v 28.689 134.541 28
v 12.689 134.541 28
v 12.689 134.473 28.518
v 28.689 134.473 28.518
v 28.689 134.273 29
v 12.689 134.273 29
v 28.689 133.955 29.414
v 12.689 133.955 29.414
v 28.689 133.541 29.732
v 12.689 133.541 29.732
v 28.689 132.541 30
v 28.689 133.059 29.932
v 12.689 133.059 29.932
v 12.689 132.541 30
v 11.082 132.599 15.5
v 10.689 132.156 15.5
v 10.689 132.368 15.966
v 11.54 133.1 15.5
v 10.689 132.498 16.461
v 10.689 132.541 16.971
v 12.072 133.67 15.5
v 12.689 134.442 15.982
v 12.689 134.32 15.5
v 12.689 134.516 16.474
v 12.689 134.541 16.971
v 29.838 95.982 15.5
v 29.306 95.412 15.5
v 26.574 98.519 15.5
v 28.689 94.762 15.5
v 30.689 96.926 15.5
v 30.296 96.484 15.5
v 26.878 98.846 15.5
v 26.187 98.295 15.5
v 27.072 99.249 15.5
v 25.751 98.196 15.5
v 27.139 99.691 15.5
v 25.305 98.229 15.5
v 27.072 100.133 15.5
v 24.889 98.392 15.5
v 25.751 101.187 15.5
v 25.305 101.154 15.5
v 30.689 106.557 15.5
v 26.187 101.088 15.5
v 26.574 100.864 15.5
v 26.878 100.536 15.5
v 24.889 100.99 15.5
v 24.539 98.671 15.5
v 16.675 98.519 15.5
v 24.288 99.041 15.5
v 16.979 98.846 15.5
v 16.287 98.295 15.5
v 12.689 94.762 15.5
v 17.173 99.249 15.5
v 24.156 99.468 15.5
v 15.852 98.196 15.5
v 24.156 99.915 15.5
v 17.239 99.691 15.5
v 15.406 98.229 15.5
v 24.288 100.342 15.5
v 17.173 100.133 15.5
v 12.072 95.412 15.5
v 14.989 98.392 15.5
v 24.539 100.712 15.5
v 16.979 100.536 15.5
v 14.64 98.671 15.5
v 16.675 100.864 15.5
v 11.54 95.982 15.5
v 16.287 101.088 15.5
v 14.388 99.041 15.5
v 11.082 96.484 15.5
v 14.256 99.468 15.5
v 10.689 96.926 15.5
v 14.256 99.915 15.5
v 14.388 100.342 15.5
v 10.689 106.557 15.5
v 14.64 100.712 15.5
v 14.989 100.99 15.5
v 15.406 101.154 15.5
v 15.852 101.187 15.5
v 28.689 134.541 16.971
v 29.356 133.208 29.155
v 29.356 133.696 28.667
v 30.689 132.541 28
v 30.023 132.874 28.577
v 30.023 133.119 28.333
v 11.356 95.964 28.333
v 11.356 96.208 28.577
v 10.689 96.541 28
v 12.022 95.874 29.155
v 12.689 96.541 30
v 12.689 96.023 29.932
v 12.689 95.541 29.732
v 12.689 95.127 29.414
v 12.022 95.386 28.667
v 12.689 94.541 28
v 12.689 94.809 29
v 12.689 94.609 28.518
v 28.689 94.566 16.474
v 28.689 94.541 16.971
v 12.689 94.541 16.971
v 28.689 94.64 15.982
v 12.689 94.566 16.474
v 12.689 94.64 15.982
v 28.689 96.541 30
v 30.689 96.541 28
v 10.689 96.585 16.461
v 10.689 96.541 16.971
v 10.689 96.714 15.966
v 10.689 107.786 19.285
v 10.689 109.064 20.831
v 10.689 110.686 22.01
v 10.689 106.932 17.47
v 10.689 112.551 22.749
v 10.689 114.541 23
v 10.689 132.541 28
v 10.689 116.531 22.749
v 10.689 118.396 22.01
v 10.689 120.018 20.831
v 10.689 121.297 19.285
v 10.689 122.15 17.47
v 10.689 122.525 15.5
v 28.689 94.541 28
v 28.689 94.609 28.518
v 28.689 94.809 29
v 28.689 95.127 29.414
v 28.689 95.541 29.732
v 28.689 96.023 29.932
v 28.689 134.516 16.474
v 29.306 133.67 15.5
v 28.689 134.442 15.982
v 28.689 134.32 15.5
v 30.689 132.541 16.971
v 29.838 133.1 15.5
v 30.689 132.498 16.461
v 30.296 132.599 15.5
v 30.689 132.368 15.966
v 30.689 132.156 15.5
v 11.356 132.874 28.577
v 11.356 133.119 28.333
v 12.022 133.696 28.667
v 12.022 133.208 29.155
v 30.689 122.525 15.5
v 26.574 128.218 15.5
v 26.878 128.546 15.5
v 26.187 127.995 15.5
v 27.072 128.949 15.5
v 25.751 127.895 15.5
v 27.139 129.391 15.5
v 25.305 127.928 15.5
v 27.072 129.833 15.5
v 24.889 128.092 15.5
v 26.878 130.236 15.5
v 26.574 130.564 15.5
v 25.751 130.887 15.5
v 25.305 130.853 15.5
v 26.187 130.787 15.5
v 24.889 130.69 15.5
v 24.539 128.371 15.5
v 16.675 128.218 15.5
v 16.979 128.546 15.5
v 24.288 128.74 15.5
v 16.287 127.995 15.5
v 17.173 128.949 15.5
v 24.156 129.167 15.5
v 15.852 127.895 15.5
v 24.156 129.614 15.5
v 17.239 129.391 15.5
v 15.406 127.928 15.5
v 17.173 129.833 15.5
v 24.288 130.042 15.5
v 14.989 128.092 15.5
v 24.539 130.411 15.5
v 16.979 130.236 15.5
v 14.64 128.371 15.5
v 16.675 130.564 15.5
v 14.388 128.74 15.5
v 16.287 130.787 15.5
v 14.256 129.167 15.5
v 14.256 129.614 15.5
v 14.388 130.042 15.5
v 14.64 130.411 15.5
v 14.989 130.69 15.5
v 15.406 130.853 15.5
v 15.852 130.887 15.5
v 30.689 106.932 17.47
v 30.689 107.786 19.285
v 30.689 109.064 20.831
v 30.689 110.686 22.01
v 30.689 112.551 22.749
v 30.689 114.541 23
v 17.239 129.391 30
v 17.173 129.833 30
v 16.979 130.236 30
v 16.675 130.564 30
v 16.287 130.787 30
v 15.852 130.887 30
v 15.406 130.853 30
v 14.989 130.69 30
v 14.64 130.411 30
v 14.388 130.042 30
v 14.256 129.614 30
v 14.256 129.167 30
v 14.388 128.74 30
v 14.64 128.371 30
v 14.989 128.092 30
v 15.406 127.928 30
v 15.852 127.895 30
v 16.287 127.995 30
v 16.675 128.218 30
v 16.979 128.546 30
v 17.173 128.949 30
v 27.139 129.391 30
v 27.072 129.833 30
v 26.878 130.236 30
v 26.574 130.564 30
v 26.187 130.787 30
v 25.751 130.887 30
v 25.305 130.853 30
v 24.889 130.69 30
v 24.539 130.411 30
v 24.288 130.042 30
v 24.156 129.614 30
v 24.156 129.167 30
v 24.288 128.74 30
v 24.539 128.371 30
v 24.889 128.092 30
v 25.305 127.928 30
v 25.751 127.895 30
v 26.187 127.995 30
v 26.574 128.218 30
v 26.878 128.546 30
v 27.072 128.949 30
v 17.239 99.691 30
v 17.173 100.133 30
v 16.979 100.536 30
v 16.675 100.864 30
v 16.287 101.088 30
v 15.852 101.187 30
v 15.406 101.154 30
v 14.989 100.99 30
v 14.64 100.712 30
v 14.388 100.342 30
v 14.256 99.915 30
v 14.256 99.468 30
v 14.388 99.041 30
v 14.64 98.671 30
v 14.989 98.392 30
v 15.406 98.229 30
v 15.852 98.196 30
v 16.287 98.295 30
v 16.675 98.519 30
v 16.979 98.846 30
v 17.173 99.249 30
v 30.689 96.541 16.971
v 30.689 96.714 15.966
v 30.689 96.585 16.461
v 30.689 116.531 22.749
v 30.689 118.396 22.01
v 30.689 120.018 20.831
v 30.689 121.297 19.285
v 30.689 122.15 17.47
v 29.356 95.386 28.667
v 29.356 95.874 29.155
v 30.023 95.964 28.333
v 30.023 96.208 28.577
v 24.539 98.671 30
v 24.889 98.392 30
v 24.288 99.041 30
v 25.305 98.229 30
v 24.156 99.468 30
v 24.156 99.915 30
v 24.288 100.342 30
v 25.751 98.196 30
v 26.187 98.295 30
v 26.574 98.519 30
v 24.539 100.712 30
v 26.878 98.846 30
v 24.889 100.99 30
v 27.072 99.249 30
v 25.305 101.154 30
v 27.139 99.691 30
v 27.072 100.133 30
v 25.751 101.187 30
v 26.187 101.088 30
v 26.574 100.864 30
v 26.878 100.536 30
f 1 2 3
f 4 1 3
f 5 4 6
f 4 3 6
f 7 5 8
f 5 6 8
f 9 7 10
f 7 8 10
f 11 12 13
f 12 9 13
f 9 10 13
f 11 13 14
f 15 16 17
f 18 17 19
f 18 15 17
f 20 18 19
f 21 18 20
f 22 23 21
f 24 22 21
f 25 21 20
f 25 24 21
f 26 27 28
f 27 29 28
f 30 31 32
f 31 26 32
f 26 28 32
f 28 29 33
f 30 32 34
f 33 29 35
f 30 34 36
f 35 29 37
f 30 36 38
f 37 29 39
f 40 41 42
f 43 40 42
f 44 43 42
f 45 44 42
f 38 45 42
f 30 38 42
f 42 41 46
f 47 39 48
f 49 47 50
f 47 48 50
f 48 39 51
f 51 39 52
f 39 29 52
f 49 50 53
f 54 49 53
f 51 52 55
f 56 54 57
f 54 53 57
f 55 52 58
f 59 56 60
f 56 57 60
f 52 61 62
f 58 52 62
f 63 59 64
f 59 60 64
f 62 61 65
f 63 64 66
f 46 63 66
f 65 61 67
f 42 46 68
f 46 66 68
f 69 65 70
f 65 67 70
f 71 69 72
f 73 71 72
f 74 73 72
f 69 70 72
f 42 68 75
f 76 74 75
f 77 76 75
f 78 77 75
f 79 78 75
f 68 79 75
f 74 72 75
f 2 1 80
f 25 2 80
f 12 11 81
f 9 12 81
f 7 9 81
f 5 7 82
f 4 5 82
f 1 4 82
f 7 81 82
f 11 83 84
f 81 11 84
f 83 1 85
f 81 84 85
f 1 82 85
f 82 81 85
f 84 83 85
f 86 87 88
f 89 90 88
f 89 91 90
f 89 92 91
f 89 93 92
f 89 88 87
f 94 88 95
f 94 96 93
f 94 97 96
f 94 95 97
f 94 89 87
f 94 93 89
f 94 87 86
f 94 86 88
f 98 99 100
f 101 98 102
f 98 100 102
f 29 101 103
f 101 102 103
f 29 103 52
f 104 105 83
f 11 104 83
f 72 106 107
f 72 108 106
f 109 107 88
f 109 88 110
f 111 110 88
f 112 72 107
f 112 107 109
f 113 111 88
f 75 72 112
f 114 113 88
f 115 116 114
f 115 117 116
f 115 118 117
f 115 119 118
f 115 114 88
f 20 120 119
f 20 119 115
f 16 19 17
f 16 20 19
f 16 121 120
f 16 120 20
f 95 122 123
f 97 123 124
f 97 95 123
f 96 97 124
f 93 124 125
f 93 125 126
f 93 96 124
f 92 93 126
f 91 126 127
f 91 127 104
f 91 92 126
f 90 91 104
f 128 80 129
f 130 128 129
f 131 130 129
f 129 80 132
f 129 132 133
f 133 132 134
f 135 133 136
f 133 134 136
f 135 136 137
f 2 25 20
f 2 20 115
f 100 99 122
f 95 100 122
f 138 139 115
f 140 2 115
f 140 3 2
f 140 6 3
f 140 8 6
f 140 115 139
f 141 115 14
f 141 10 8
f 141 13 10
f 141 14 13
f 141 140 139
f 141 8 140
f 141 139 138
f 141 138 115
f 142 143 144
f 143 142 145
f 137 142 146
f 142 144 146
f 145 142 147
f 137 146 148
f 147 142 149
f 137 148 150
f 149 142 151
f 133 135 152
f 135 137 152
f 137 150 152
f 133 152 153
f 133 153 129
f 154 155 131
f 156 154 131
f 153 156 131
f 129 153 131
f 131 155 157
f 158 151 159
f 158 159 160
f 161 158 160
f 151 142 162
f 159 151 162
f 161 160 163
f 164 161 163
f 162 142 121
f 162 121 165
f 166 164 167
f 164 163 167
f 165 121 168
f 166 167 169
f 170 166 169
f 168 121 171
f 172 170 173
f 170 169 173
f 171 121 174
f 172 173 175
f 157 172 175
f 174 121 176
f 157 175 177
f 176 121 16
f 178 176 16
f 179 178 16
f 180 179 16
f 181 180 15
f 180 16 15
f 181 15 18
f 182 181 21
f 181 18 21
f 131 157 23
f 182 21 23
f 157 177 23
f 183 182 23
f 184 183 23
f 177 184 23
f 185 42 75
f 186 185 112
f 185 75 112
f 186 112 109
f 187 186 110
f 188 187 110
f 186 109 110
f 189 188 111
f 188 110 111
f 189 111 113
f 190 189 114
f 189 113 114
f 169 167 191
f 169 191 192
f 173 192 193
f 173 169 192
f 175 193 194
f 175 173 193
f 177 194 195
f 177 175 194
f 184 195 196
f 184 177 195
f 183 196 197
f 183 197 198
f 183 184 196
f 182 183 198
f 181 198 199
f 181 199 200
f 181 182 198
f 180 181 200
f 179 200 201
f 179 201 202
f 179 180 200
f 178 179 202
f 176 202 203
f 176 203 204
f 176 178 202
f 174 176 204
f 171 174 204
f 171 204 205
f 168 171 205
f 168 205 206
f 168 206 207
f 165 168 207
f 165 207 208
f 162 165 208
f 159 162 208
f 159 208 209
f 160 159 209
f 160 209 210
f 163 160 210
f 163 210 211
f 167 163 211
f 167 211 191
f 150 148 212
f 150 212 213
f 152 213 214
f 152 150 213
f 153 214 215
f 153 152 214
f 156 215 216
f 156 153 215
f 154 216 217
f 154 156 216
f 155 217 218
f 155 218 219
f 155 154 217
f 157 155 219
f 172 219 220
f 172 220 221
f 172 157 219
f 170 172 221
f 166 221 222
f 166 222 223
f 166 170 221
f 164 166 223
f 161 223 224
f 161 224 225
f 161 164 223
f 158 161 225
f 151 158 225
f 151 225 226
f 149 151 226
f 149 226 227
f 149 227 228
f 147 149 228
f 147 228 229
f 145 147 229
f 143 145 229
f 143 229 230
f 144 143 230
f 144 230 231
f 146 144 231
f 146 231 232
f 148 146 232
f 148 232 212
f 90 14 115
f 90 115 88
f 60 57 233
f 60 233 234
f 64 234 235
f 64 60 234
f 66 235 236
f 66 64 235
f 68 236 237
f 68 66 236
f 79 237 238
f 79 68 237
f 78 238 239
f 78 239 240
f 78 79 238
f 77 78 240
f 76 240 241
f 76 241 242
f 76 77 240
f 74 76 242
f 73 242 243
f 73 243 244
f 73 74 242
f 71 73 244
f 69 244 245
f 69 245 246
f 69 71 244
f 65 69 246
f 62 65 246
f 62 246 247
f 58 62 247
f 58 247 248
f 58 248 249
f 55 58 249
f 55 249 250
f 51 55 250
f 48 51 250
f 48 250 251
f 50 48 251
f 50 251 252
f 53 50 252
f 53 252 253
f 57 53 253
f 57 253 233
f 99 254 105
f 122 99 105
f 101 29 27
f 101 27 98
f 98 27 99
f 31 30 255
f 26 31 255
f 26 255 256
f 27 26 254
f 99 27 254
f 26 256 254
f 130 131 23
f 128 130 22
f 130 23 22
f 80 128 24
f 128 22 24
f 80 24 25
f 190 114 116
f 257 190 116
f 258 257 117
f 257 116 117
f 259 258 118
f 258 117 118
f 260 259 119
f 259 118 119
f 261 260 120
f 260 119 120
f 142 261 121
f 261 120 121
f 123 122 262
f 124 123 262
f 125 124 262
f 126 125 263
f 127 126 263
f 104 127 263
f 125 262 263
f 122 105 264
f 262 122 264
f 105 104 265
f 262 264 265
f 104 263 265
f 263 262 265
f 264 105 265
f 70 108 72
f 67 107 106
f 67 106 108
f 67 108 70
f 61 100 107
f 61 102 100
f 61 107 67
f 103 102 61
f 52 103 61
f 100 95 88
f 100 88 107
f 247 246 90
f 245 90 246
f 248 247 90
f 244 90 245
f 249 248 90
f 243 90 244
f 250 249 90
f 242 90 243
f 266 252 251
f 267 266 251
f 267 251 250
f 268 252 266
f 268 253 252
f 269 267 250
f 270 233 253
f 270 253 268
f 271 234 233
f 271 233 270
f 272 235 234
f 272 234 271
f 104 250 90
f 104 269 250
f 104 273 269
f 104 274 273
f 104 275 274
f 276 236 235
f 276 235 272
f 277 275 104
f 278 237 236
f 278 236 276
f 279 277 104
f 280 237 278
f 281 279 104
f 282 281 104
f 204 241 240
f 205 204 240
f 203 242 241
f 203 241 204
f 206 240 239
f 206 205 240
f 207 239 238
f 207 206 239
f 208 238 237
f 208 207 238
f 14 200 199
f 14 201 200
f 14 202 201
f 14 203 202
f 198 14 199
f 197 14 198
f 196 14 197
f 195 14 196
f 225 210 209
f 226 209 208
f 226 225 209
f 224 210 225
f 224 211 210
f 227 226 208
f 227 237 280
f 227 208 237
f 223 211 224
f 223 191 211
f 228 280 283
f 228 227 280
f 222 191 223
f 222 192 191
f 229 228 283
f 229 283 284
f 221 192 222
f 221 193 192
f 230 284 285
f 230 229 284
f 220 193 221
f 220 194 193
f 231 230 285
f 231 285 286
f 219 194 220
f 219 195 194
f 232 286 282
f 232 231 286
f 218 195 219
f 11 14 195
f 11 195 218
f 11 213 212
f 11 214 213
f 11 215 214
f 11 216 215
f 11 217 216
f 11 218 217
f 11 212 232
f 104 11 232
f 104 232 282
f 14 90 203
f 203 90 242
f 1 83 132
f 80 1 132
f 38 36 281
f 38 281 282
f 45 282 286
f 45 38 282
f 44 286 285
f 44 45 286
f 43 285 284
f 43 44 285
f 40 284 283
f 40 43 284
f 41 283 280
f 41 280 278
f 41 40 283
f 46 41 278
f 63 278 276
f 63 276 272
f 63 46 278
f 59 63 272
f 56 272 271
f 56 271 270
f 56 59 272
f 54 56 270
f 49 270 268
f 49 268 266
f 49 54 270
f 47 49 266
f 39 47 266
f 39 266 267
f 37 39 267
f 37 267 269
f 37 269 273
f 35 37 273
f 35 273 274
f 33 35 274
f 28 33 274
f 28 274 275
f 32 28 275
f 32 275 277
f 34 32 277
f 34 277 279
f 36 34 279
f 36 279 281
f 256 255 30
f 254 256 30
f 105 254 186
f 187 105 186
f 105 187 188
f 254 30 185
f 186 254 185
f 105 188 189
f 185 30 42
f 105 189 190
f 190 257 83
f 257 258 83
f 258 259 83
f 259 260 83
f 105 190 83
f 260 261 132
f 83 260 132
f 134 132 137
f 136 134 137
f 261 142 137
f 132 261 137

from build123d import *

# Parameters (mm, degrees)
SKETCH2_W           = 20
SKETCH2_H           = 49.6
SKETCH2_R           = 1.5
BOSS_EXTRUDE1_DEPTH = 30
CUT_EXTRUDE1_DEPTH  = 30
CUT_EXTRUDE2_DEPTH  = 22
FILLET1_R           = 5
FILLET2_R           = 2
CHAMFER1_SIZE       = 2
SKETCH5_R           = 3
SKETCH5_R_2         = 1.5
CUT_EXTRUDE3_DEPTH  = 12
CUT_EXTRUDE4_DEPTH  = 23


with BuildPart() as part:
    # Sketch2 → Boss-Extrude1 (new body)
    with BuildSketch(Plane.XY):
        with Locations((20.689228864, 114.541105708)):
            Rectangle(SKETCH2_W, SKETCH2_H)
        with Locations((15.739481395, 99.69135824)):
            Circle(SKETCH2_R, mode=Mode.SUBTRACT)
        with Locations((25.638976332, 99.69135824)):
            Circle(SKETCH2_R, mode=Mode.SUBTRACT)
        with Locations((25.638976332, 129.390853177)):
            Circle(SKETCH2_R, mode=Mode.SUBTRACT)
        with Locations((15.739481395, 129.390853177)):
            Circle(SKETCH2_R, mode=Mode.SUBTRACT)
    extrude(amount=BOSS_EXTRUDE1_DEPTH)

    # Sketch3 → Cut-Extrude1 (cut)
    with BuildSketch(Plane(origin=(30.689228864, 0, 0), x_dir=(0, 0, -1), z_dir=(1, 0, 0))):
        Polygon((-10, 119.541105708), (-18.024193548, 119.541105708), (-11.975806452, 109.541105708), (-10, 109.541105708), align=None)
        Polygon((-11.975806452, 109.541105708), (-18.024193548, 119.541105708), (-20, 119.541105708), (-20, 109.541105708), align=None)
    extrude(amount=-CUT_EXTRUDE1_DEPTH, mode=Mode.SUBTRACT)

    # Sketch4 → Cut-Extrude2 (cut)
    with BuildSketch(Plane(origin=(30.689228864, 0, 0), x_dir=(0, 0, -1), z_dir=(1, 0, 0))):
        Polygon((-30, 139.341105708), (-27.096774194, 134.541105708), (-15, 134.541105708), (0, 134.541105708), (0, 139.341105708), align=None)
        Polygon((-30, 134.541105708), (-27.096774194, 134.541105708), (-30, 139.341105708), align=None)
        Polygon((-15, 134.541105708), (0, 120.541105708), (0, 134.541105708), align=None)
        Polygon((-7.268041237, 101.757600554), (-2.903225806, 94.541105708), (0, 94.541105708), (0, 108.541105708), align=None)
        Polygon((-15, 94.541105708), (-2.903225806, 94.541105708), (-7.268041237, 101.757600554), align=None)
        Polygon((-30, 89.741105708), (0, 89.741105708), (-2.903225806, 94.541105708), (-15, 94.541105708), (-30, 94.541105708), align=None)
        Polygon((-2.903225806, 94.541105708), (0, 89.741105708), (0, 94.541105708), align=None)
    extrude(amount=-CUT_EXTRUDE2_DEPTH, mode=Mode.SUBTRACT)

    # Fillet1
    fillet1_edges = [part.edges().sort_by_distance(p)[0] for p in [
        (20.689228864, 134.541105708, 15),
        (20.689228864, 120.541105708, 0),
        (20.689228864, 94.541105708, 15),
        (20.689228864, 108.541105708, 0),
    ]]
    fillet(fillet1_edges, radius=FILLET1_R)

    # Fillet2
    fillet2_edges = [part.edges().sort_by_distance(p)[0] for p in [
        (20.689228864, 134.541105708, 30),
        (20.689228864, 94.541105708, 30),
    ]]
    fillet(fillet2_edges, radius=FILLET2_R)

    # Chamfer1
    chamfer1_edges = [part.edges().sort_by_distance(p)[0] for p in [
        (30.689228864, 127.610001295, 7.5738167),
        (10.689228864, 127.610001295, 7.5738167),
        (30.689228864, 114.541105708, 0),
        (30.689228864, 101.472210122, 7.5738167),
        (30.689228864, 108.721124919, 0.414263622),
        (30.689228864, 120.361086498, 0.414263622),
        (30.689228864, 94.889418826, 15.137292206),
        (30.689228864, 134.192792591, 15.137292206),
        (10.689228864, 114.541105708, 0),
        (10.689228864, 101.472210122, 7.5738167),
        (10.689228864, 108.721124919, 0.414263622),
        (10.689228864, 120.361086498, 0.414263622),
        (10.689228864, 94.889418826, 15.137292206),
        (10.689228864, 134.192792591, 15.137292206),
        (10.689228864, 114.541105708, 30),
        (30.689228864, 114.541105708, 30),
        (30.689228864, 134.541105708, 22.485407952),
        (30.689228864, 94.541105708, 22.485407952),
        (30.689228864, 133.955319271, 29.414213562),
        (30.689228864, 95.126892146, 29.414213562),
        (10.689228864, 94.541105708, 22.485407952),
        (10.689228864, 134.541105708, 22.485407952),
        (10.689228864, 133.955319271, 29.414213562),
        (10.689228864, 95.126892146, 29.414213562),
    ]]
    chamfer(chamfer1_edges, length=CHAMFER1_SIZE - 0.0001)  # a hair under: the kernel refuses the full size

    # Sketch5 → Cut-Extrude3 (cut)
    # profile 1 of 4: a face of its own
    with BuildSketch(Plane(origin=(0, 0, 0), x_dir=(-1, 0, 0), z_dir=(0, 0, -1))):
        with Locations((-15.739481395, 99.69135824)):
            Circle(SKETCH5_R)
        with Locations((-15.739481395, 99.69135824)):
            Circle(SKETCH5_R_2, mode=Mode.SUBTRACT)
    # profile 2 of 4: a face of its own
    with BuildSketch(Plane(origin=(0, 0, 0), x_dir=(-1, 0, 0), z_dir=(0, 0, -1))):
        with Locations((-25.638976332, 99.69135824)):
            Circle(SKETCH5_R)
        with Locations((-25.638976332, 99.69135824)):
            Circle(SKETCH5_R_2, mode=Mode.SUBTRACT)
    # profile 3 of 4: a face of its own
    with BuildSketch(Plane(origin=(0, 0, 0), x_dir=(-1, 0, 0), z_dir=(0, 0, -1))):
        with Locations((-15.739481395, 129.390853177)):
            Circle(SKETCH5_R)
        with Locations((-15.739481395, 129.390853177)):
            Circle(SKETCH5_R_2, mode=Mode.SUBTRACT)
    # profile 4 of 4: a face of its own
    with BuildSketch(Plane(origin=(0, 0, 0), x_dir=(-1, 0, 0), z_dir=(0, 0, -1))):
        with Locations((-25.638976332, 129.390853177)):
            Circle(SKETCH5_R)
        with Locations((-25.638976332, 129.390853177)):
            Circle(SKETCH5_R_2, mode=Mode.SUBTRACT)
    extrude(amount=-CUT_EXTRUDE3_DEPTH, mode=Mode.SUBTRACT)

    # Sketch6 → Cut-Extrude4 (cut)
    with BuildSketch(Plane.ZY.offset(-10.689228864)):
        with BuildLine():
            Line((15, 91.202832585), (15, 97.279273558))
            ThreePointArc((15, 97.279273558), (14.961637209, 97.313281439), (14.923861152, 97.347939904))
            Line((14.923861152, 97.347939904), (2.953045249, 108.520701413))
            ThreePointArc((2.953045249, 108.520701413), (2.248558173, 109.518221838), (2, 110.713867218))
            Line((2, 110.713867218), (2, 118.368344199))
            ThreePointArc((2, 118.368344199), (2.248558173, 119.563989578), (2.953045249, 120.561510003))
            Line((2.953045249, 120.561510003), (14.923861152, 131.734271513))
            ThreePointArc((14.923861152, 131.734271513), (14.961637209, 131.768929978), (15, 131.802937859))
            Line((15, 131.802937859), (15, 137.879378832))
            Line((15, 137.879378832), (-6.953674883, 137.879378832))
            Line((-6.953674883, 137.879378832), (-6.953674883, 91.202832585))
            Line((-6.953674883, 91.202832585), (15, 91.202832585))
        make_face()
        with BuildLine():
            Line((15, 122.541105708), (15, 119.541105708))
            Line((15, 119.541105708), (15.5, 119.541105708))
            Line((15.5, 119.541105708), (15.5, 122.52546542))
            ThreePointArc((15.5, 122.52546542), (15.250122279, 122.53719468), (15, 122.541105708))
        make_face()
        with BuildLine():
            Line((20, 109.541105708), (15.5, 109.541105708))
            Line((15.5, 109.541105708), (15.5, 106.556745997))
            ThreePointArc((15.5, 106.556745997), (20.830951895, 109.063880133), (23, 114.541105708))
            ThreePointArc((23, 114.541105708), (20.830951895, 120.018331283), (15.5, 122.52546542))
            Line((15.5, 122.52546542), (15.5, 119.541105708))
            Line((15.5, 119.541105708), (20, 119.541105708))
            Line((20, 119.541105708), (20, 109.541105708))
        make_face()
        with BuildLine():
            Line((15, 109.541105708), (10, 109.541105708))
            Line((10, 109.541105708), (10, 119.541105708))
            Line((10, 119.541105708), (15, 119.541105708))
            Line((15, 119.541105708), (15, 122.541105708))
            ThreePointArc((15, 122.541105708), (7, 114.541105708), (15, 106.541105708))
            Line((15, 106.541105708), (15, 109.541105708))
        make_face()
        Polygon((10, 119.541105708), (10, 109.541105708), (15, 114.541105708), (15, 119.541105708), align=None)
        Polygon((15, 119.541105708), (15, 114.541105708), (15.5, 115.041105708), (15.5, 119.541105708), align=None)
        Polygon((15.5, 119.541105708), (15.5, 115.041105708), (20, 119.541105708), align=None)
        Polygon((20, 119.541105708), (15.5, 115.041105708), (15.5, 109.541105708), (20, 109.541105708), align=None)
        Polygon((15.5, 115.041105708), (15, 114.541105708), (15, 109.541105708), (15.5, 109.541105708), align=None)
        Polygon((15, 114.541105708), (10, 109.541105708), (15, 109.541105708), align=None)
        with BuildLine():
            Line((15.5, 109.541105708), (15, 109.541105708))
            Line((15, 109.541105708), (15, 106.541105708))
            ThreePointArc((15, 106.541105708), (15.250122279, 106.545016736), (15.5, 106.556745997))
            Line((15.5, 106.556745997), (15.5, 109.541105708))
        make_face()
        with BuildLine():
            Line((15, 131.802937859), (15, 122.541105708))
            ThreePointArc((15, 122.541105708), (15.250122279, 122.53719468), (15.5, 122.52546542))
            Line((15.5, 122.52546542), (15.5, 132.155814216))
            ThreePointArc((15.5, 132.155814216), (15.240978395, 131.992158991), (15, 131.802937859))
        make_face()
        with BuildLine():
            ThreePointArc((15.5, 96.926397201), (15.240978395, 97.090052425), (15, 97.279273558))
            Line((15, 97.279273558), (15, 91.202832585))
            Line((15, 91.202832585), (15.5, 91.202832585))
            Line((15.5, 91.202832585), (15.5, 96.926397201))
        make_face()
        with BuildLine():
            ThreePointArc((15.5, 106.556745997), (15.250122279, 106.545016736), (15, 106.541105708))
            Line((15, 106.541105708), (15, 97.279273558))
            ThreePointArc((15, 97.279273558), (15.240978395, 97.090052425), (15.5, 96.926397201))
            Line((15.5, 96.926397201), (15.5, 106.556745997))
        make_face()
        with BuildLine():
            Line((15, 97.279273558), (15, 106.541105708))
            ThreePointArc((15, 106.541105708), (7, 114.541105708), (15, 122.541105708))
            Line((15, 122.541105708), (15, 131.802937859))
            ThreePointArc((15, 131.802937859), (14.961637209, 131.768929978), (14.923861152, 131.734271513))
            Line((14.923861152, 131.734271513), (2.953045249, 120.561510003))
            ThreePointArc((2.953045249, 120.561510003), (2.248558173, 119.563989578), (2, 118.368344199))
            Line((2, 118.368344199), (2, 110.713867218))
            ThreePointArc((2, 110.713867218), (2.248558173, 109.518221838), (2.953045249, 108.520701413))
            Line((2.953045249, 108.520701413), (14.923861152, 97.347939904))
            ThreePointArc((14.923861152, 97.347939904), (14.961637209, 97.313281439), (15, 97.279273558))
        make_face()
        with BuildLine():
            Line((15, 137.879378832), (15, 131.802937859))
            ThreePointArc((15, 131.802937859), (15.240978395, 131.992158991), (15.5, 132.155814216))
            Line((15.5, 132.155814216), (15.5, 137.879378832))
            Line((15.5, 137.879378832), (15, 137.879378832))
        make_face()
    extrude(amount=-CUT_EXTRUDE4_DEPTH, mode=Mode.SUBTRACT)


solid = part.part
